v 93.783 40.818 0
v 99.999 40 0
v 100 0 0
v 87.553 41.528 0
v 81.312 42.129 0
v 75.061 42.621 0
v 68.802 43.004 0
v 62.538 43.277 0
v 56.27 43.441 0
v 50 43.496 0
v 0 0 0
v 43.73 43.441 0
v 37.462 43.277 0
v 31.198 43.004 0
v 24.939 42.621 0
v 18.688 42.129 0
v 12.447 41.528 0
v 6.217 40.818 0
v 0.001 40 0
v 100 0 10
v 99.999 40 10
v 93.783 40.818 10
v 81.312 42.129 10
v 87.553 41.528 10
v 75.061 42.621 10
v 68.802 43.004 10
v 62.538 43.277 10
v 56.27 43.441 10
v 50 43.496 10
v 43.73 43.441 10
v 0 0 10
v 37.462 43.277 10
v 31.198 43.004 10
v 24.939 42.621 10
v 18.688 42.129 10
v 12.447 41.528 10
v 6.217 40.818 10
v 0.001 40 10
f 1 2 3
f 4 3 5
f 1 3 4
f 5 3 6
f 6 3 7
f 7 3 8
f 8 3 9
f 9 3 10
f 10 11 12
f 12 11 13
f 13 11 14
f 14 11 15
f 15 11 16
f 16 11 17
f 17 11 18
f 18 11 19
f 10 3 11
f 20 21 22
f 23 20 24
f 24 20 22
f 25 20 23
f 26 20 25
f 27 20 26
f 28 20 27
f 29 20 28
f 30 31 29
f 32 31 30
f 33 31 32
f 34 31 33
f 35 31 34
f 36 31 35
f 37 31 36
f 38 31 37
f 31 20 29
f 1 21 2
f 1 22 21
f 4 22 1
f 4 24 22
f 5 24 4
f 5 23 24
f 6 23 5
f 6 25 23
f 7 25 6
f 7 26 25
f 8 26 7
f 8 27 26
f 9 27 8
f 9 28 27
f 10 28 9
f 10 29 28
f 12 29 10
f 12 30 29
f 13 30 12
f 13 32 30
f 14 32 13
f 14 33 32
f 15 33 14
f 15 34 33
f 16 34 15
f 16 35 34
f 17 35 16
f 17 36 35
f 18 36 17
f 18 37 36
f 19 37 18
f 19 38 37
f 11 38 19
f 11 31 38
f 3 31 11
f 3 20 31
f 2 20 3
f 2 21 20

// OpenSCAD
$fn = 32;

// ----------------------------------------------------------------------
// Arc profile plate: crown, 19 points
// ----------------------------------------------------------------------

// --- parameters (mm) ---
bar_l = 100;              // bar length, X
bar_w = 40;               // bar height at the ends, Y
arc_r = 359.26;           // radius of the crown arc
arc_angle = 16;           // crown arc angle, degrees
crown_rise = 3.5;         // rise of the crown over the ends
arc_step = 1;             // sampling step of the crown arc, degrees
plate_t = 10;             // plate thickness, Z

bbox_y = bar_w + crown_rise;  // full height with the crown

profile = [[99.999, 40], [93.783, 40.818], [87.553, 41.528], [81.312, 42.129], [75.061, 42.621], [68.802, 43.004], [62.538, 43.277], [56.27, 43.441], [50, 43.496], [43.73, 43.441], [37.462, 43.277], [31.198, 43.004], [24.939, 42.621], [18.688, 42.129], [12.447, 41.528], [6.217, 40.818], [0.001, 40], [0, 0], [100, 0]];  // primary outline, 19 points, counter clockwise

// --- the one profile operation ---
linear_extrude(height = plate_t) polygon(points = profile);
